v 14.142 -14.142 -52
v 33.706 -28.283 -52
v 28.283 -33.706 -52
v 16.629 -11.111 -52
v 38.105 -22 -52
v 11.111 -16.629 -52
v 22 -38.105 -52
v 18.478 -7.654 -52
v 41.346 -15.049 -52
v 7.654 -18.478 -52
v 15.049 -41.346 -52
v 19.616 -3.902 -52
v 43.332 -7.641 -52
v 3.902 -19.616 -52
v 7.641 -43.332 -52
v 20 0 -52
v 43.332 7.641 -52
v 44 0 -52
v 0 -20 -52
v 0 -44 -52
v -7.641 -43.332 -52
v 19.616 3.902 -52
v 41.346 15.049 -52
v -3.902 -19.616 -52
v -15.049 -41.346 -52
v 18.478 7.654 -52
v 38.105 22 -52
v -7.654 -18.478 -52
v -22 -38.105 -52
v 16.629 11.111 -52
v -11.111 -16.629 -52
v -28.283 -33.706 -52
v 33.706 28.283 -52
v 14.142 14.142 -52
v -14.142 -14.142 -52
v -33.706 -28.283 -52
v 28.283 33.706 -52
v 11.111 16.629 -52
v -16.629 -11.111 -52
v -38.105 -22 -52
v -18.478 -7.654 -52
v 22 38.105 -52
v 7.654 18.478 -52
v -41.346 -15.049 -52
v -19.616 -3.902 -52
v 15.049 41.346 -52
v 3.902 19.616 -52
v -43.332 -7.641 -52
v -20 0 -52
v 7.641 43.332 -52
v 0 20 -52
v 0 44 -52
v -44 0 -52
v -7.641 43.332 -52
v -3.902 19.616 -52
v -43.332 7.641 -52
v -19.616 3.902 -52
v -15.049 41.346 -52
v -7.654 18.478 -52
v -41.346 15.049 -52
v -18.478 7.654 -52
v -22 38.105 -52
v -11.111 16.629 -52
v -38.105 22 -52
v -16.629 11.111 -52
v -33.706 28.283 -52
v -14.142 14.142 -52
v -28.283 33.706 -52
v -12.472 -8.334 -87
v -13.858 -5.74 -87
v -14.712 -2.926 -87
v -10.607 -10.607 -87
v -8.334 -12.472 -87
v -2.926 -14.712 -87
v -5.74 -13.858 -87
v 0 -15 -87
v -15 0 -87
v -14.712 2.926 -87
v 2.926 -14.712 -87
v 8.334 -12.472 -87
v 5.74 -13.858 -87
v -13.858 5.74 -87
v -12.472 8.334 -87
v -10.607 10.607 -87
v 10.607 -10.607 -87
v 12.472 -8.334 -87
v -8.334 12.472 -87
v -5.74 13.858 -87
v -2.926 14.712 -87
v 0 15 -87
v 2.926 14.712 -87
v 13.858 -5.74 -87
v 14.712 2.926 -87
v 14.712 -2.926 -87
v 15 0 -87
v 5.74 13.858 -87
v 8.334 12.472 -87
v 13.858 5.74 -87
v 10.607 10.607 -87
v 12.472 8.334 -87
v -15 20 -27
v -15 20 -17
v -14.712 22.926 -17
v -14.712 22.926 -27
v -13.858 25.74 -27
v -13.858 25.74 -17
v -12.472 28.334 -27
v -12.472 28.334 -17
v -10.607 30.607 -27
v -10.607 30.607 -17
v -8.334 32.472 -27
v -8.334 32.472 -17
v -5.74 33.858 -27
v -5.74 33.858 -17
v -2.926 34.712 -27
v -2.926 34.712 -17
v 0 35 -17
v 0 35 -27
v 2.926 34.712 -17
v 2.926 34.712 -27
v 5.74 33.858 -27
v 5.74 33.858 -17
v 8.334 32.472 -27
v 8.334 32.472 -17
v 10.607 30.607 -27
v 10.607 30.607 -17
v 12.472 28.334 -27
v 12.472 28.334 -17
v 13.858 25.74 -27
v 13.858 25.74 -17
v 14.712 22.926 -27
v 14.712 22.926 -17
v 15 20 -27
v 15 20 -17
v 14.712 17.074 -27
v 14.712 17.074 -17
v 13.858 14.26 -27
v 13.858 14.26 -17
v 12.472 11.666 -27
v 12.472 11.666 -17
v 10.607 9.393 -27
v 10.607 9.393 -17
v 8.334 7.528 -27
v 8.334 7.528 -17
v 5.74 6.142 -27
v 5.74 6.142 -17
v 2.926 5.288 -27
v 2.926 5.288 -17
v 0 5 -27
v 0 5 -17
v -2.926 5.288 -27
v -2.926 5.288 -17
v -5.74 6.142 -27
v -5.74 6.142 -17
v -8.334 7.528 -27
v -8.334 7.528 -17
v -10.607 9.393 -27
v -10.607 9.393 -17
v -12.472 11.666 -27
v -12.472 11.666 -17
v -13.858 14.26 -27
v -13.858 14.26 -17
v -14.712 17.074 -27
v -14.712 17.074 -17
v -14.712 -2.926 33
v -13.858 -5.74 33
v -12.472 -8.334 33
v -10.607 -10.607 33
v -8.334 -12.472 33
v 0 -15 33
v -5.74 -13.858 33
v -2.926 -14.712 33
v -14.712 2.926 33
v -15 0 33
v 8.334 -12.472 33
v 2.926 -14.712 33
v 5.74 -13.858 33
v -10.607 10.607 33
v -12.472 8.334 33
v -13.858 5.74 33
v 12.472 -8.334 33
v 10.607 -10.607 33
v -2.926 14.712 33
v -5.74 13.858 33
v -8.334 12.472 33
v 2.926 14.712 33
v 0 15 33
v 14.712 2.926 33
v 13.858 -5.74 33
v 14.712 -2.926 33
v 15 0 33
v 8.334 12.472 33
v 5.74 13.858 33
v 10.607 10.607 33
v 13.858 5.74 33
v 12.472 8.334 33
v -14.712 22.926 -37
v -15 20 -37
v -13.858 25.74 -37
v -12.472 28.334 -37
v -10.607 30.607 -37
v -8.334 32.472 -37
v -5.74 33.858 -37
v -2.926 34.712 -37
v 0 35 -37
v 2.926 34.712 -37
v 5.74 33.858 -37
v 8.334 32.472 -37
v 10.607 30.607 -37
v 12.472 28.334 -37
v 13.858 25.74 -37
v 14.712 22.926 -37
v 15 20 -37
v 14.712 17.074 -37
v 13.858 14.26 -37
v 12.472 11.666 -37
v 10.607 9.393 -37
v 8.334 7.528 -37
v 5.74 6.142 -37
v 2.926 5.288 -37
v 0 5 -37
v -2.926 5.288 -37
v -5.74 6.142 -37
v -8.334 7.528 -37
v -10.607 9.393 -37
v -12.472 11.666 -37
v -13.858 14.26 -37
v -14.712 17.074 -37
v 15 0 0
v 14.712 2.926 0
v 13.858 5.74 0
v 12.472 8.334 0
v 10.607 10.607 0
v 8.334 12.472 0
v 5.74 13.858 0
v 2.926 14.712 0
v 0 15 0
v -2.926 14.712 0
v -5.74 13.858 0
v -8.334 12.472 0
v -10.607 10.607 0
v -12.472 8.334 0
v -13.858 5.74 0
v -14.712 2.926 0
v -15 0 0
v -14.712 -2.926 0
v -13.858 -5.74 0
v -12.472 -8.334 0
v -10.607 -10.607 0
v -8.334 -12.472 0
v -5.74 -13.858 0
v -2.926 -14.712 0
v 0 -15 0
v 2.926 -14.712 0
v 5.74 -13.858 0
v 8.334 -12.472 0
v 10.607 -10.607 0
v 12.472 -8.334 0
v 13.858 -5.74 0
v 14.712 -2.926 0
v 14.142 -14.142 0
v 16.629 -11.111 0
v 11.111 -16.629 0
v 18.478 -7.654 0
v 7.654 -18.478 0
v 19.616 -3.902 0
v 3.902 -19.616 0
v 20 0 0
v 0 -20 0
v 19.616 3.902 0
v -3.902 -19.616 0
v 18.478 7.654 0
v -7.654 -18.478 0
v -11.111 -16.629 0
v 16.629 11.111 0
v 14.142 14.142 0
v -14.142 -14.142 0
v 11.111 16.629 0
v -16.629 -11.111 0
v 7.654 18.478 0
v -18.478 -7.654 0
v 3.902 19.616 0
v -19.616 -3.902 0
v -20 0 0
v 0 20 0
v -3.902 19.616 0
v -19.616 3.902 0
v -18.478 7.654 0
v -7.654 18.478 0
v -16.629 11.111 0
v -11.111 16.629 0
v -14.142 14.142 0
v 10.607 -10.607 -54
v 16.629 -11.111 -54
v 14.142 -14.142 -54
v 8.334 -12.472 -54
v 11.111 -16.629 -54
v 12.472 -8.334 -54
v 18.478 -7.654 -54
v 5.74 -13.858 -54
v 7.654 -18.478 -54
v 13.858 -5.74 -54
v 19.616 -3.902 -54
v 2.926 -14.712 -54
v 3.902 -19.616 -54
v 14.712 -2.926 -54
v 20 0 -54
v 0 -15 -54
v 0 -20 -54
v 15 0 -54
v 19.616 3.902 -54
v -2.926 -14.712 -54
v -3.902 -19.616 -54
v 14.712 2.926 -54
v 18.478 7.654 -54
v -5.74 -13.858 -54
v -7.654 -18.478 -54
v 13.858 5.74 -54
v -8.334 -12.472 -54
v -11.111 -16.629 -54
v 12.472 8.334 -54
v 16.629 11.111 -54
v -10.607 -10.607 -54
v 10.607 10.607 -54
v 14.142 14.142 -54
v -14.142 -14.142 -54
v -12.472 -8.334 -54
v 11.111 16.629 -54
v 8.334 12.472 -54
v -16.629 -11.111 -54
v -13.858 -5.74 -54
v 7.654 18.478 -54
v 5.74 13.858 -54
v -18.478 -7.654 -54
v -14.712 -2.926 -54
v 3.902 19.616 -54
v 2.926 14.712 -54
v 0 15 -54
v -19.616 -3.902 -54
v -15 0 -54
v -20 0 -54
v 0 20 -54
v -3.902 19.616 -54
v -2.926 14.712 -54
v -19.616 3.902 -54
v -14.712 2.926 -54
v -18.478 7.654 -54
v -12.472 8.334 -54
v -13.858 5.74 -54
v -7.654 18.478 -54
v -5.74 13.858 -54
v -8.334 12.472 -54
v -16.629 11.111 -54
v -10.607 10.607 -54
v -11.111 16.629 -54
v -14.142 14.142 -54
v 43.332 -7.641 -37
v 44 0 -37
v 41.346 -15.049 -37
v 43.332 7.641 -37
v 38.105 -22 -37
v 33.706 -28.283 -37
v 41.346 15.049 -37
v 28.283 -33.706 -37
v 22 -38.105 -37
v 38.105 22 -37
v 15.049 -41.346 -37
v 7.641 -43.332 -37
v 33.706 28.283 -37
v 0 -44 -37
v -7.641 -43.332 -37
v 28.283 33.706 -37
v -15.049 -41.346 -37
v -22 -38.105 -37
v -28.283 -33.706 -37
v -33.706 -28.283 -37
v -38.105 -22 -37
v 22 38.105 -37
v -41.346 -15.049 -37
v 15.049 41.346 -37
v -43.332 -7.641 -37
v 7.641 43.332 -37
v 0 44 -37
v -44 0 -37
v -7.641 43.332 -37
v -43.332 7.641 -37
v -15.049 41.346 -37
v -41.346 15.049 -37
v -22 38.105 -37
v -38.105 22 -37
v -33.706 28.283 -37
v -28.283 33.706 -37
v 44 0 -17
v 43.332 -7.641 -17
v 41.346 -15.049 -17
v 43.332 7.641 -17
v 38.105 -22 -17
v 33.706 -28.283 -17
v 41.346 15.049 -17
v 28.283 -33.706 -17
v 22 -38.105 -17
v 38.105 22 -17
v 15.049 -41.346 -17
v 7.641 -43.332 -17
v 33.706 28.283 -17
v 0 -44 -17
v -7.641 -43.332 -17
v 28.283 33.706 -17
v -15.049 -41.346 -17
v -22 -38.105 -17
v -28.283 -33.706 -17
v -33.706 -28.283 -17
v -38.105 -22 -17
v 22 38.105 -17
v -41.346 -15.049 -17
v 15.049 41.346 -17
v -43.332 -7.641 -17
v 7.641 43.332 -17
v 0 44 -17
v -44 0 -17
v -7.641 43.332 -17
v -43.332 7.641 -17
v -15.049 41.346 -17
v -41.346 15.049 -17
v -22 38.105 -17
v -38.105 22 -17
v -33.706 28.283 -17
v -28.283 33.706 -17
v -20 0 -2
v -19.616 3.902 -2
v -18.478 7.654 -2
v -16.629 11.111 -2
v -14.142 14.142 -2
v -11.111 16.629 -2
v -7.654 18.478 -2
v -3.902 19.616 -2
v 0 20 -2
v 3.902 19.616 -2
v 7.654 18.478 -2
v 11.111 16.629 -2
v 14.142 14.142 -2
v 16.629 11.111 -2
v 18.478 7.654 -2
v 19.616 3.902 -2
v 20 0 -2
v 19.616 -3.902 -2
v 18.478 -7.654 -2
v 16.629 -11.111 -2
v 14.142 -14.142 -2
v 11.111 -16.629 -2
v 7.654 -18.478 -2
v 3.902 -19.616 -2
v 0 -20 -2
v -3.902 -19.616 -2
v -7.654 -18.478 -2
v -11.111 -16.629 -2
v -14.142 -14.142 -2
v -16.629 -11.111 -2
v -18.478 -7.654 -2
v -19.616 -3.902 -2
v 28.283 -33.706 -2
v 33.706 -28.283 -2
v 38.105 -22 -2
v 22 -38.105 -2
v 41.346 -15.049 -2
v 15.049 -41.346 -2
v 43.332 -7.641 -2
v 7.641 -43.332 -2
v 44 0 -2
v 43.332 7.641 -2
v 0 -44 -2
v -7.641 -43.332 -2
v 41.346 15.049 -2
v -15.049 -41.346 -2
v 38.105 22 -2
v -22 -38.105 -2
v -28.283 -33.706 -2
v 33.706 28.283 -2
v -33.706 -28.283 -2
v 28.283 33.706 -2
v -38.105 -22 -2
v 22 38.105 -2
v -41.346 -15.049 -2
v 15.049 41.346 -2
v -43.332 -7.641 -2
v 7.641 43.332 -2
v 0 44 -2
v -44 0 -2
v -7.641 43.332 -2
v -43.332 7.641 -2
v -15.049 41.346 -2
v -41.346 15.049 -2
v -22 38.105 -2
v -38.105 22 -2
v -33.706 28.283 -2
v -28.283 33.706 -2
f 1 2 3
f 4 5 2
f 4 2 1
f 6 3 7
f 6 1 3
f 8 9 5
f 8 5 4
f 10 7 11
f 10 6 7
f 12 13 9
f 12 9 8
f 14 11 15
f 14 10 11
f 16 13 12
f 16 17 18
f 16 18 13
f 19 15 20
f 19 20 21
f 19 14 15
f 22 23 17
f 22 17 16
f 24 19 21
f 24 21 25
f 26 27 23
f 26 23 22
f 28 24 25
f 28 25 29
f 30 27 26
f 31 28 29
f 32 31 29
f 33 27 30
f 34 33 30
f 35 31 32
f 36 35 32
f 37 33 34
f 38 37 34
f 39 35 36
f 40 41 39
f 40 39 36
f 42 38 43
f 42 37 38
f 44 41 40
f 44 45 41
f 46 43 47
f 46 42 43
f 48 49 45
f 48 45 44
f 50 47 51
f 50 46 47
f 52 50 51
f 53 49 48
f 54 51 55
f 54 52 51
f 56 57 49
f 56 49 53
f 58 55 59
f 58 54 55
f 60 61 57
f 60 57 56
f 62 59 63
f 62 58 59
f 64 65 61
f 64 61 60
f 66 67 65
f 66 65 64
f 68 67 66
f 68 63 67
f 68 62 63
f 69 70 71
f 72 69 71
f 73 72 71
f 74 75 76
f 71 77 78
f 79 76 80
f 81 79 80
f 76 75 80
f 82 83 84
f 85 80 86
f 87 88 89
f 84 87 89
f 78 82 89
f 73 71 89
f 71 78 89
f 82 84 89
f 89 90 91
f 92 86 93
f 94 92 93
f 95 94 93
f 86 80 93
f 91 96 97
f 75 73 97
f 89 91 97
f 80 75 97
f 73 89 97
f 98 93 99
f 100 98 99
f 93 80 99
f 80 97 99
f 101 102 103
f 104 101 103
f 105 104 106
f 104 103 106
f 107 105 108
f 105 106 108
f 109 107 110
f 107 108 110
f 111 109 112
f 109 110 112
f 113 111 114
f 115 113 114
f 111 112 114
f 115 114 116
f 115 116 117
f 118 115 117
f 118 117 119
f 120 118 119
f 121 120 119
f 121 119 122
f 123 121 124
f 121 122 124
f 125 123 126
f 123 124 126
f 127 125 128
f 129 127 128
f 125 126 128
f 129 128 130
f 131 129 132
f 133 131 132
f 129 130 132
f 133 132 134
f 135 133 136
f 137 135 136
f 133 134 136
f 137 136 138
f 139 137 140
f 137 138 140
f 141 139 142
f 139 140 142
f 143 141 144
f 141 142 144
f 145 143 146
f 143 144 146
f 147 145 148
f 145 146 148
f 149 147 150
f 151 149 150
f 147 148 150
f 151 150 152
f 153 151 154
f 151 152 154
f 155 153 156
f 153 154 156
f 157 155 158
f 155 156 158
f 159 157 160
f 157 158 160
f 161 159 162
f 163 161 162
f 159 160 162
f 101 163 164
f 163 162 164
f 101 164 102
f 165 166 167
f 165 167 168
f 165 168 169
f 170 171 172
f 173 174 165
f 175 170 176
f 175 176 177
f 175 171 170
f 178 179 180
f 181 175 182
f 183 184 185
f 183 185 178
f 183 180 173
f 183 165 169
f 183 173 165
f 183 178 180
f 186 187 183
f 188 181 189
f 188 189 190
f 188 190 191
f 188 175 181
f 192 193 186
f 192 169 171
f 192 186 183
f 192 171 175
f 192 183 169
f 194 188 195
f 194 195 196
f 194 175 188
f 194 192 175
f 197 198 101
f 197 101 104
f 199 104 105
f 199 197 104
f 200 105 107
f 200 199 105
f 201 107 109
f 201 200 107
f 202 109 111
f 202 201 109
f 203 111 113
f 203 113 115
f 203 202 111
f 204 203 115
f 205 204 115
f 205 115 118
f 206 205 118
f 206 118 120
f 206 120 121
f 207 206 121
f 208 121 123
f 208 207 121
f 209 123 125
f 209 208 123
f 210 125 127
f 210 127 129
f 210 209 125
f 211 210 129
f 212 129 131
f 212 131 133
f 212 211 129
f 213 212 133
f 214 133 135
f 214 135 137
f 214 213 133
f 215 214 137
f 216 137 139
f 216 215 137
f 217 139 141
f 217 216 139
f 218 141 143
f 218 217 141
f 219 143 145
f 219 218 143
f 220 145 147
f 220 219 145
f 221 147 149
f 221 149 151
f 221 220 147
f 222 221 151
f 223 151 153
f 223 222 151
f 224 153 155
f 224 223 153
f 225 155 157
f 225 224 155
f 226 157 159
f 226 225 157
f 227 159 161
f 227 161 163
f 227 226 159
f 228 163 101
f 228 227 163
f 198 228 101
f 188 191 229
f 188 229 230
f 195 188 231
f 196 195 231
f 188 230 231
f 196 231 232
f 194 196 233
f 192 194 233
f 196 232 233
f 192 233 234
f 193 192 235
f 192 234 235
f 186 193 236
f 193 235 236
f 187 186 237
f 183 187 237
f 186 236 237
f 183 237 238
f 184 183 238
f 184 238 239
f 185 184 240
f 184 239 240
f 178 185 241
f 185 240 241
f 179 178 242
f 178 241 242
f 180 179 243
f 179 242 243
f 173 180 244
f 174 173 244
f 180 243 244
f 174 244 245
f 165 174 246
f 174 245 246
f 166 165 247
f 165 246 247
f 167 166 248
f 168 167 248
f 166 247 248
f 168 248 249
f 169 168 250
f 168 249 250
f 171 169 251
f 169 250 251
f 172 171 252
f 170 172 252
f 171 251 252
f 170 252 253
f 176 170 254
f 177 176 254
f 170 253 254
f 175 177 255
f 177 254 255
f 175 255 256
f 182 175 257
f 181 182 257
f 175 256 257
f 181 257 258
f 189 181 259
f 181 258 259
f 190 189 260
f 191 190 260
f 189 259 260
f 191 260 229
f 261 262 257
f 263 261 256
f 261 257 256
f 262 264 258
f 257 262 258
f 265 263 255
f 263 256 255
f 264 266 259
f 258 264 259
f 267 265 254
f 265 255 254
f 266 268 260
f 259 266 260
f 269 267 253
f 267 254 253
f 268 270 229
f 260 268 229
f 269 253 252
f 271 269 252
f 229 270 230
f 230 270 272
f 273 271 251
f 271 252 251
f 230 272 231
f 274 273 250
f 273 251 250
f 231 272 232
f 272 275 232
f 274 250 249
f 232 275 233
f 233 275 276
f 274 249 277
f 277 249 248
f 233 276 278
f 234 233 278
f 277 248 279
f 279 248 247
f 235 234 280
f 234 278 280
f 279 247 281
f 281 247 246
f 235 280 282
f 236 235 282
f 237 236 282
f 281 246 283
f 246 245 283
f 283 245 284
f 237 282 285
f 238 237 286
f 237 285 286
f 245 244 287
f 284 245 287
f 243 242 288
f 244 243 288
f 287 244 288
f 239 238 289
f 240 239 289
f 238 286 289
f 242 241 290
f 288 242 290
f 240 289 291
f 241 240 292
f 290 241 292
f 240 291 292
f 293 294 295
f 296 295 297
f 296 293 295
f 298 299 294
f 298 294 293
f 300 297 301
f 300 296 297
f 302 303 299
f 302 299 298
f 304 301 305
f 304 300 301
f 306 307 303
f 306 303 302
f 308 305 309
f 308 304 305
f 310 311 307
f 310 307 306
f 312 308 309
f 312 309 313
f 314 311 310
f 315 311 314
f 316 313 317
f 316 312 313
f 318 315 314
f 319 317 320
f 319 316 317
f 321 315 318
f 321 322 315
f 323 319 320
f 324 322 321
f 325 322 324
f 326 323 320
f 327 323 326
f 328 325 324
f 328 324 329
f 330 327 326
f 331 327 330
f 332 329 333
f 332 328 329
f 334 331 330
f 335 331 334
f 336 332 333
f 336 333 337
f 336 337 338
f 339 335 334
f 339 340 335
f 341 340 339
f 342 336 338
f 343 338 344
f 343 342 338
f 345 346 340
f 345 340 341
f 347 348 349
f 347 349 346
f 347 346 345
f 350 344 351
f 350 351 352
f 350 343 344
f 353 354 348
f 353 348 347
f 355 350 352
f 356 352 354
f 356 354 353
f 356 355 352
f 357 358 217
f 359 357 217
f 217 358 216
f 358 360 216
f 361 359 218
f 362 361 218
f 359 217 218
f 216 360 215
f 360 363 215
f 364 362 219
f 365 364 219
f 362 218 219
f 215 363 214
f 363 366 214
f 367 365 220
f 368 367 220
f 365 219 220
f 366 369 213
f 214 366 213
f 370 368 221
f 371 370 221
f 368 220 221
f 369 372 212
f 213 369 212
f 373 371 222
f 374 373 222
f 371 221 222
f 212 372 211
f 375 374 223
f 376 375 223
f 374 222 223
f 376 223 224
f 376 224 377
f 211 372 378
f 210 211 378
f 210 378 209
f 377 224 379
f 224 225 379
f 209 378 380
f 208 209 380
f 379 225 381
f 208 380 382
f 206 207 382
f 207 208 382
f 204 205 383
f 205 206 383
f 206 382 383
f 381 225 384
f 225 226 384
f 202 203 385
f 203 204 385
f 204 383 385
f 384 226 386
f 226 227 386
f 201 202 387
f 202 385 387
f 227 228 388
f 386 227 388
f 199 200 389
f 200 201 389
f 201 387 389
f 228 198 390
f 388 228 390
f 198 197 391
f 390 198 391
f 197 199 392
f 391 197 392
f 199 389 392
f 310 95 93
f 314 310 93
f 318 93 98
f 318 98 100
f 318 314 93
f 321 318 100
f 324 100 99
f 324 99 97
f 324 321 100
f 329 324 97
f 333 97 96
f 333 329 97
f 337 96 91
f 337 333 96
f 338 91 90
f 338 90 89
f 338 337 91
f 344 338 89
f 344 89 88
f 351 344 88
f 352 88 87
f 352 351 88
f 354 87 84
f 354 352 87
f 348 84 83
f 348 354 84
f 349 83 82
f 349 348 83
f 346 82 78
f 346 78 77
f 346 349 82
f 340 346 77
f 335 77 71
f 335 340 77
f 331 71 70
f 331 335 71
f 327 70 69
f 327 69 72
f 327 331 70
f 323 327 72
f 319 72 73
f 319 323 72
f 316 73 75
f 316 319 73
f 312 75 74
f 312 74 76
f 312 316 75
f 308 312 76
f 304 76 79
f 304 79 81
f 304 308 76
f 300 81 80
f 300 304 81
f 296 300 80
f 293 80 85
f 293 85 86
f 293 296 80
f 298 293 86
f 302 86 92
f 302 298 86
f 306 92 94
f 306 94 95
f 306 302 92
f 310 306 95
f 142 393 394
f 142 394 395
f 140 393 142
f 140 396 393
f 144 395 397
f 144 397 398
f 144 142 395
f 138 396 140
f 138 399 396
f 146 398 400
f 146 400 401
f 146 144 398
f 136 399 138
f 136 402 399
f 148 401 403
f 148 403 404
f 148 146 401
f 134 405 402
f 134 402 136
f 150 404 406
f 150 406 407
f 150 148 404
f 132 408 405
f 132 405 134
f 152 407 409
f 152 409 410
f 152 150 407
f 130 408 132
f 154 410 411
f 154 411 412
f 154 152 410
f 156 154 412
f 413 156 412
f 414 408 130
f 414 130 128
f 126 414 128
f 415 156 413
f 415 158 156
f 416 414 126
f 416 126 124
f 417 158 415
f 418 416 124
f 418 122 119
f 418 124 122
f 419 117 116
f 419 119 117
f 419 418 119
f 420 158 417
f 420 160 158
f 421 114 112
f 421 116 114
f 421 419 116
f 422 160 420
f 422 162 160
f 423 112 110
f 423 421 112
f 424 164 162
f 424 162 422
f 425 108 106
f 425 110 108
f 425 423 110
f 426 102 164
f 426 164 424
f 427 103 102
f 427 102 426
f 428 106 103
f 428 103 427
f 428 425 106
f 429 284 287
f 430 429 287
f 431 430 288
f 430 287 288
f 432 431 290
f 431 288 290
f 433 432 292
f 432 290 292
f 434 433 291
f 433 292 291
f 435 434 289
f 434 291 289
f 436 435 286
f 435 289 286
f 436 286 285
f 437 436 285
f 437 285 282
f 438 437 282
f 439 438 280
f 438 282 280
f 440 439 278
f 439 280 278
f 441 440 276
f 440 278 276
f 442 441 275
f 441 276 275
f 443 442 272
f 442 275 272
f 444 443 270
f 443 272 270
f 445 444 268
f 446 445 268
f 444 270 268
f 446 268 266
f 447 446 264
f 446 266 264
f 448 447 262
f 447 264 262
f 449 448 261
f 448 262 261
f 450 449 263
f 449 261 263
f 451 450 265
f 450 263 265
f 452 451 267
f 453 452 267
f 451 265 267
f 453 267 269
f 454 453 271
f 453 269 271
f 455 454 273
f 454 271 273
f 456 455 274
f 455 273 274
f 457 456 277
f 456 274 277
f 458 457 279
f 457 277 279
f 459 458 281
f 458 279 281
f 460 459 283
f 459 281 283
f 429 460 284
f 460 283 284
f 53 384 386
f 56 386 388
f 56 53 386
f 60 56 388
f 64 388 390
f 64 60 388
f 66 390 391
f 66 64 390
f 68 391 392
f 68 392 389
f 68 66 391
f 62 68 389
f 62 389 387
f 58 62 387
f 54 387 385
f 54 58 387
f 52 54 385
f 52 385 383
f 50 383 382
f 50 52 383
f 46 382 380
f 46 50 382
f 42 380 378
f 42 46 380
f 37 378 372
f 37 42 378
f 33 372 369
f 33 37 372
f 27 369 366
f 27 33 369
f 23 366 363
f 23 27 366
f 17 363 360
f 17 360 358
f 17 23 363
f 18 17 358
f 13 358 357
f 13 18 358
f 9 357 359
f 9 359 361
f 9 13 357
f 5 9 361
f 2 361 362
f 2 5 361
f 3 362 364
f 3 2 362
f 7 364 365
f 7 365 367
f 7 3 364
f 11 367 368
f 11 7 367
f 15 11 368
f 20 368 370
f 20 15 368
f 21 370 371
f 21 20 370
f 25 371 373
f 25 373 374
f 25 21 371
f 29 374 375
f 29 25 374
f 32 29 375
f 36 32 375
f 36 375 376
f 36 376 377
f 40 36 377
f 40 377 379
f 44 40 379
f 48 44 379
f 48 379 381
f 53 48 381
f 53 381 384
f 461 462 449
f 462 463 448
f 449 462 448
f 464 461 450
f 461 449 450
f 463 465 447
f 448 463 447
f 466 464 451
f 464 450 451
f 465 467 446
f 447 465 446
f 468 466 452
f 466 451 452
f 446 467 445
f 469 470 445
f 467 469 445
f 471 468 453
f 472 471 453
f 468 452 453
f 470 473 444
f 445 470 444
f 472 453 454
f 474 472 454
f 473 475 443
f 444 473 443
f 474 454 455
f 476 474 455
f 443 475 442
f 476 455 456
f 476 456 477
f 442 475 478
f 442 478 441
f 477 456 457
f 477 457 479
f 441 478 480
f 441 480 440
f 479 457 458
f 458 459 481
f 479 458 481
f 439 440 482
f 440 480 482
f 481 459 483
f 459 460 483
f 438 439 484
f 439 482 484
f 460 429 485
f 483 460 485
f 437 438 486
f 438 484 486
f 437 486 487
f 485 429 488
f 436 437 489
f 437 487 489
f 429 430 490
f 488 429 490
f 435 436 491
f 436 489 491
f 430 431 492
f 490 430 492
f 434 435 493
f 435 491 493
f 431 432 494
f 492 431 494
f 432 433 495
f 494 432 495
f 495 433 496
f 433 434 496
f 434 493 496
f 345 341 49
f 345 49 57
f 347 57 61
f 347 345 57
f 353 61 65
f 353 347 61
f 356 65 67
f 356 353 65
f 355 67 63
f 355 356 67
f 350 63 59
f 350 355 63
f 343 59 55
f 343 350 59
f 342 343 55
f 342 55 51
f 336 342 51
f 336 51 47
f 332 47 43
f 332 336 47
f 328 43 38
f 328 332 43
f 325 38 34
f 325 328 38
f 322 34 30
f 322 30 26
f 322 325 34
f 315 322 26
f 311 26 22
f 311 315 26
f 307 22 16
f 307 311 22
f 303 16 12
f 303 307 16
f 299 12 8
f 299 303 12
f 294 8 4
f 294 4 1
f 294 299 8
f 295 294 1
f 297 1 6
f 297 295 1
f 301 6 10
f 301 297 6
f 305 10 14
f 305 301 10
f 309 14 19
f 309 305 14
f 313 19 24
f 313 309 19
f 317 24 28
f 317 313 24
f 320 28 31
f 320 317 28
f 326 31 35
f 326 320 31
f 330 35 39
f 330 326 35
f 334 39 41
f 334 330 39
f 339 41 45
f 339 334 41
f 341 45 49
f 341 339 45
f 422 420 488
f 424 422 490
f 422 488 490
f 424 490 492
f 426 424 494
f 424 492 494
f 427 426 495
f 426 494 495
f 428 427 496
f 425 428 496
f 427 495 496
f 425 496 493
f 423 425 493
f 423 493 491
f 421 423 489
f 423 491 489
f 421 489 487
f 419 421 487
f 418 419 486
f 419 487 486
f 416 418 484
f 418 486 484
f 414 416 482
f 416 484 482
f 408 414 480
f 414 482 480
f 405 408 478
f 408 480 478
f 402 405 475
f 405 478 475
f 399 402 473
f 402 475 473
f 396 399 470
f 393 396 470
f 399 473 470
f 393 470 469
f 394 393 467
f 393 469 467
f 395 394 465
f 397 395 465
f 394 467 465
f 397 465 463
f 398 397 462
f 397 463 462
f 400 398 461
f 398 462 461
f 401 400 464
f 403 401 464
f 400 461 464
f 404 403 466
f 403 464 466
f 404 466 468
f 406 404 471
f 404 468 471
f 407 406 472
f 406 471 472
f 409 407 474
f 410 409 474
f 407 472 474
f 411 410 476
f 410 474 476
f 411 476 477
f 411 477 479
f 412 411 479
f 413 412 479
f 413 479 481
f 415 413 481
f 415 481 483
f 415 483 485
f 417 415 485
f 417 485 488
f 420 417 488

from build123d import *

# Parameters (mm, degrees)
SZKIC1_R                    = 15
DODANIE_WYCI_GNI_CIE1_DEPTH = 33
SZKIC2_R                    = 20
DODANIE_WYCI_GNI_CIE2_DEPTH = 2
SZKIC3_R                    = 44
DODANIE_WYCI_GNI_CIE3_DEPTH = 15
SZKIC4_R                    = 15
DODANIE_WYCI_GNI_CIE4_DEPTH = 10


with BuildPart() as part:
    # Szkic1 → Dodanie-wyciągnięcie1 (new body)
    with BuildSketch(Plane.XY):
        Circle(SZKIC1_R)
    extrude(amount=DODANIE_WYCI_GNI_CIE1_DEPTH)

    # Szkic2 → Dodanie-wyciągnięcie2 (add)
    with BuildSketch(Plane(origin=(0, 0, 0), x_dir=(-1, 0, 0), z_dir=(0, 0, -1))):
        Circle(SZKIC2_R)
    extrude(amount=DODANIE_WYCI_GNI_CIE2_DEPTH)

    # Szkic3 → Dodanie-wyciągnięcie3 (add)
    with BuildSketch(Plane(origin=(0, 0, -2), x_dir=(-1, 0, 0), z_dir=(0, 0, -1))):
        Circle(SZKIC3_R)
    extrude(amount=DODANIE_WYCI_GNI_CIE3_DEPTH)

    # Szkic4 → Dodanie-wyciągnięcie4 (add)
    with BuildSketch(Plane(origin=(0, 0, -17), x_dir=(-1, 0, 0), z_dir=(0, 0, -1))):
        with Locations((0, 20)):
            Circle(SZKIC4_R)
    extrude(amount=DODANIE_WYCI_GNI_CIE4_DEPTH)

    # Lustro1: part across plane


with BuildPart() as part_1:
    add(part.part)
    add(part.part.mirror(Plane(origin=(0, 20, -27), x_dir=(1, 0, 0), z_dir=(0, 0, -1))))


solid = part_1.part
